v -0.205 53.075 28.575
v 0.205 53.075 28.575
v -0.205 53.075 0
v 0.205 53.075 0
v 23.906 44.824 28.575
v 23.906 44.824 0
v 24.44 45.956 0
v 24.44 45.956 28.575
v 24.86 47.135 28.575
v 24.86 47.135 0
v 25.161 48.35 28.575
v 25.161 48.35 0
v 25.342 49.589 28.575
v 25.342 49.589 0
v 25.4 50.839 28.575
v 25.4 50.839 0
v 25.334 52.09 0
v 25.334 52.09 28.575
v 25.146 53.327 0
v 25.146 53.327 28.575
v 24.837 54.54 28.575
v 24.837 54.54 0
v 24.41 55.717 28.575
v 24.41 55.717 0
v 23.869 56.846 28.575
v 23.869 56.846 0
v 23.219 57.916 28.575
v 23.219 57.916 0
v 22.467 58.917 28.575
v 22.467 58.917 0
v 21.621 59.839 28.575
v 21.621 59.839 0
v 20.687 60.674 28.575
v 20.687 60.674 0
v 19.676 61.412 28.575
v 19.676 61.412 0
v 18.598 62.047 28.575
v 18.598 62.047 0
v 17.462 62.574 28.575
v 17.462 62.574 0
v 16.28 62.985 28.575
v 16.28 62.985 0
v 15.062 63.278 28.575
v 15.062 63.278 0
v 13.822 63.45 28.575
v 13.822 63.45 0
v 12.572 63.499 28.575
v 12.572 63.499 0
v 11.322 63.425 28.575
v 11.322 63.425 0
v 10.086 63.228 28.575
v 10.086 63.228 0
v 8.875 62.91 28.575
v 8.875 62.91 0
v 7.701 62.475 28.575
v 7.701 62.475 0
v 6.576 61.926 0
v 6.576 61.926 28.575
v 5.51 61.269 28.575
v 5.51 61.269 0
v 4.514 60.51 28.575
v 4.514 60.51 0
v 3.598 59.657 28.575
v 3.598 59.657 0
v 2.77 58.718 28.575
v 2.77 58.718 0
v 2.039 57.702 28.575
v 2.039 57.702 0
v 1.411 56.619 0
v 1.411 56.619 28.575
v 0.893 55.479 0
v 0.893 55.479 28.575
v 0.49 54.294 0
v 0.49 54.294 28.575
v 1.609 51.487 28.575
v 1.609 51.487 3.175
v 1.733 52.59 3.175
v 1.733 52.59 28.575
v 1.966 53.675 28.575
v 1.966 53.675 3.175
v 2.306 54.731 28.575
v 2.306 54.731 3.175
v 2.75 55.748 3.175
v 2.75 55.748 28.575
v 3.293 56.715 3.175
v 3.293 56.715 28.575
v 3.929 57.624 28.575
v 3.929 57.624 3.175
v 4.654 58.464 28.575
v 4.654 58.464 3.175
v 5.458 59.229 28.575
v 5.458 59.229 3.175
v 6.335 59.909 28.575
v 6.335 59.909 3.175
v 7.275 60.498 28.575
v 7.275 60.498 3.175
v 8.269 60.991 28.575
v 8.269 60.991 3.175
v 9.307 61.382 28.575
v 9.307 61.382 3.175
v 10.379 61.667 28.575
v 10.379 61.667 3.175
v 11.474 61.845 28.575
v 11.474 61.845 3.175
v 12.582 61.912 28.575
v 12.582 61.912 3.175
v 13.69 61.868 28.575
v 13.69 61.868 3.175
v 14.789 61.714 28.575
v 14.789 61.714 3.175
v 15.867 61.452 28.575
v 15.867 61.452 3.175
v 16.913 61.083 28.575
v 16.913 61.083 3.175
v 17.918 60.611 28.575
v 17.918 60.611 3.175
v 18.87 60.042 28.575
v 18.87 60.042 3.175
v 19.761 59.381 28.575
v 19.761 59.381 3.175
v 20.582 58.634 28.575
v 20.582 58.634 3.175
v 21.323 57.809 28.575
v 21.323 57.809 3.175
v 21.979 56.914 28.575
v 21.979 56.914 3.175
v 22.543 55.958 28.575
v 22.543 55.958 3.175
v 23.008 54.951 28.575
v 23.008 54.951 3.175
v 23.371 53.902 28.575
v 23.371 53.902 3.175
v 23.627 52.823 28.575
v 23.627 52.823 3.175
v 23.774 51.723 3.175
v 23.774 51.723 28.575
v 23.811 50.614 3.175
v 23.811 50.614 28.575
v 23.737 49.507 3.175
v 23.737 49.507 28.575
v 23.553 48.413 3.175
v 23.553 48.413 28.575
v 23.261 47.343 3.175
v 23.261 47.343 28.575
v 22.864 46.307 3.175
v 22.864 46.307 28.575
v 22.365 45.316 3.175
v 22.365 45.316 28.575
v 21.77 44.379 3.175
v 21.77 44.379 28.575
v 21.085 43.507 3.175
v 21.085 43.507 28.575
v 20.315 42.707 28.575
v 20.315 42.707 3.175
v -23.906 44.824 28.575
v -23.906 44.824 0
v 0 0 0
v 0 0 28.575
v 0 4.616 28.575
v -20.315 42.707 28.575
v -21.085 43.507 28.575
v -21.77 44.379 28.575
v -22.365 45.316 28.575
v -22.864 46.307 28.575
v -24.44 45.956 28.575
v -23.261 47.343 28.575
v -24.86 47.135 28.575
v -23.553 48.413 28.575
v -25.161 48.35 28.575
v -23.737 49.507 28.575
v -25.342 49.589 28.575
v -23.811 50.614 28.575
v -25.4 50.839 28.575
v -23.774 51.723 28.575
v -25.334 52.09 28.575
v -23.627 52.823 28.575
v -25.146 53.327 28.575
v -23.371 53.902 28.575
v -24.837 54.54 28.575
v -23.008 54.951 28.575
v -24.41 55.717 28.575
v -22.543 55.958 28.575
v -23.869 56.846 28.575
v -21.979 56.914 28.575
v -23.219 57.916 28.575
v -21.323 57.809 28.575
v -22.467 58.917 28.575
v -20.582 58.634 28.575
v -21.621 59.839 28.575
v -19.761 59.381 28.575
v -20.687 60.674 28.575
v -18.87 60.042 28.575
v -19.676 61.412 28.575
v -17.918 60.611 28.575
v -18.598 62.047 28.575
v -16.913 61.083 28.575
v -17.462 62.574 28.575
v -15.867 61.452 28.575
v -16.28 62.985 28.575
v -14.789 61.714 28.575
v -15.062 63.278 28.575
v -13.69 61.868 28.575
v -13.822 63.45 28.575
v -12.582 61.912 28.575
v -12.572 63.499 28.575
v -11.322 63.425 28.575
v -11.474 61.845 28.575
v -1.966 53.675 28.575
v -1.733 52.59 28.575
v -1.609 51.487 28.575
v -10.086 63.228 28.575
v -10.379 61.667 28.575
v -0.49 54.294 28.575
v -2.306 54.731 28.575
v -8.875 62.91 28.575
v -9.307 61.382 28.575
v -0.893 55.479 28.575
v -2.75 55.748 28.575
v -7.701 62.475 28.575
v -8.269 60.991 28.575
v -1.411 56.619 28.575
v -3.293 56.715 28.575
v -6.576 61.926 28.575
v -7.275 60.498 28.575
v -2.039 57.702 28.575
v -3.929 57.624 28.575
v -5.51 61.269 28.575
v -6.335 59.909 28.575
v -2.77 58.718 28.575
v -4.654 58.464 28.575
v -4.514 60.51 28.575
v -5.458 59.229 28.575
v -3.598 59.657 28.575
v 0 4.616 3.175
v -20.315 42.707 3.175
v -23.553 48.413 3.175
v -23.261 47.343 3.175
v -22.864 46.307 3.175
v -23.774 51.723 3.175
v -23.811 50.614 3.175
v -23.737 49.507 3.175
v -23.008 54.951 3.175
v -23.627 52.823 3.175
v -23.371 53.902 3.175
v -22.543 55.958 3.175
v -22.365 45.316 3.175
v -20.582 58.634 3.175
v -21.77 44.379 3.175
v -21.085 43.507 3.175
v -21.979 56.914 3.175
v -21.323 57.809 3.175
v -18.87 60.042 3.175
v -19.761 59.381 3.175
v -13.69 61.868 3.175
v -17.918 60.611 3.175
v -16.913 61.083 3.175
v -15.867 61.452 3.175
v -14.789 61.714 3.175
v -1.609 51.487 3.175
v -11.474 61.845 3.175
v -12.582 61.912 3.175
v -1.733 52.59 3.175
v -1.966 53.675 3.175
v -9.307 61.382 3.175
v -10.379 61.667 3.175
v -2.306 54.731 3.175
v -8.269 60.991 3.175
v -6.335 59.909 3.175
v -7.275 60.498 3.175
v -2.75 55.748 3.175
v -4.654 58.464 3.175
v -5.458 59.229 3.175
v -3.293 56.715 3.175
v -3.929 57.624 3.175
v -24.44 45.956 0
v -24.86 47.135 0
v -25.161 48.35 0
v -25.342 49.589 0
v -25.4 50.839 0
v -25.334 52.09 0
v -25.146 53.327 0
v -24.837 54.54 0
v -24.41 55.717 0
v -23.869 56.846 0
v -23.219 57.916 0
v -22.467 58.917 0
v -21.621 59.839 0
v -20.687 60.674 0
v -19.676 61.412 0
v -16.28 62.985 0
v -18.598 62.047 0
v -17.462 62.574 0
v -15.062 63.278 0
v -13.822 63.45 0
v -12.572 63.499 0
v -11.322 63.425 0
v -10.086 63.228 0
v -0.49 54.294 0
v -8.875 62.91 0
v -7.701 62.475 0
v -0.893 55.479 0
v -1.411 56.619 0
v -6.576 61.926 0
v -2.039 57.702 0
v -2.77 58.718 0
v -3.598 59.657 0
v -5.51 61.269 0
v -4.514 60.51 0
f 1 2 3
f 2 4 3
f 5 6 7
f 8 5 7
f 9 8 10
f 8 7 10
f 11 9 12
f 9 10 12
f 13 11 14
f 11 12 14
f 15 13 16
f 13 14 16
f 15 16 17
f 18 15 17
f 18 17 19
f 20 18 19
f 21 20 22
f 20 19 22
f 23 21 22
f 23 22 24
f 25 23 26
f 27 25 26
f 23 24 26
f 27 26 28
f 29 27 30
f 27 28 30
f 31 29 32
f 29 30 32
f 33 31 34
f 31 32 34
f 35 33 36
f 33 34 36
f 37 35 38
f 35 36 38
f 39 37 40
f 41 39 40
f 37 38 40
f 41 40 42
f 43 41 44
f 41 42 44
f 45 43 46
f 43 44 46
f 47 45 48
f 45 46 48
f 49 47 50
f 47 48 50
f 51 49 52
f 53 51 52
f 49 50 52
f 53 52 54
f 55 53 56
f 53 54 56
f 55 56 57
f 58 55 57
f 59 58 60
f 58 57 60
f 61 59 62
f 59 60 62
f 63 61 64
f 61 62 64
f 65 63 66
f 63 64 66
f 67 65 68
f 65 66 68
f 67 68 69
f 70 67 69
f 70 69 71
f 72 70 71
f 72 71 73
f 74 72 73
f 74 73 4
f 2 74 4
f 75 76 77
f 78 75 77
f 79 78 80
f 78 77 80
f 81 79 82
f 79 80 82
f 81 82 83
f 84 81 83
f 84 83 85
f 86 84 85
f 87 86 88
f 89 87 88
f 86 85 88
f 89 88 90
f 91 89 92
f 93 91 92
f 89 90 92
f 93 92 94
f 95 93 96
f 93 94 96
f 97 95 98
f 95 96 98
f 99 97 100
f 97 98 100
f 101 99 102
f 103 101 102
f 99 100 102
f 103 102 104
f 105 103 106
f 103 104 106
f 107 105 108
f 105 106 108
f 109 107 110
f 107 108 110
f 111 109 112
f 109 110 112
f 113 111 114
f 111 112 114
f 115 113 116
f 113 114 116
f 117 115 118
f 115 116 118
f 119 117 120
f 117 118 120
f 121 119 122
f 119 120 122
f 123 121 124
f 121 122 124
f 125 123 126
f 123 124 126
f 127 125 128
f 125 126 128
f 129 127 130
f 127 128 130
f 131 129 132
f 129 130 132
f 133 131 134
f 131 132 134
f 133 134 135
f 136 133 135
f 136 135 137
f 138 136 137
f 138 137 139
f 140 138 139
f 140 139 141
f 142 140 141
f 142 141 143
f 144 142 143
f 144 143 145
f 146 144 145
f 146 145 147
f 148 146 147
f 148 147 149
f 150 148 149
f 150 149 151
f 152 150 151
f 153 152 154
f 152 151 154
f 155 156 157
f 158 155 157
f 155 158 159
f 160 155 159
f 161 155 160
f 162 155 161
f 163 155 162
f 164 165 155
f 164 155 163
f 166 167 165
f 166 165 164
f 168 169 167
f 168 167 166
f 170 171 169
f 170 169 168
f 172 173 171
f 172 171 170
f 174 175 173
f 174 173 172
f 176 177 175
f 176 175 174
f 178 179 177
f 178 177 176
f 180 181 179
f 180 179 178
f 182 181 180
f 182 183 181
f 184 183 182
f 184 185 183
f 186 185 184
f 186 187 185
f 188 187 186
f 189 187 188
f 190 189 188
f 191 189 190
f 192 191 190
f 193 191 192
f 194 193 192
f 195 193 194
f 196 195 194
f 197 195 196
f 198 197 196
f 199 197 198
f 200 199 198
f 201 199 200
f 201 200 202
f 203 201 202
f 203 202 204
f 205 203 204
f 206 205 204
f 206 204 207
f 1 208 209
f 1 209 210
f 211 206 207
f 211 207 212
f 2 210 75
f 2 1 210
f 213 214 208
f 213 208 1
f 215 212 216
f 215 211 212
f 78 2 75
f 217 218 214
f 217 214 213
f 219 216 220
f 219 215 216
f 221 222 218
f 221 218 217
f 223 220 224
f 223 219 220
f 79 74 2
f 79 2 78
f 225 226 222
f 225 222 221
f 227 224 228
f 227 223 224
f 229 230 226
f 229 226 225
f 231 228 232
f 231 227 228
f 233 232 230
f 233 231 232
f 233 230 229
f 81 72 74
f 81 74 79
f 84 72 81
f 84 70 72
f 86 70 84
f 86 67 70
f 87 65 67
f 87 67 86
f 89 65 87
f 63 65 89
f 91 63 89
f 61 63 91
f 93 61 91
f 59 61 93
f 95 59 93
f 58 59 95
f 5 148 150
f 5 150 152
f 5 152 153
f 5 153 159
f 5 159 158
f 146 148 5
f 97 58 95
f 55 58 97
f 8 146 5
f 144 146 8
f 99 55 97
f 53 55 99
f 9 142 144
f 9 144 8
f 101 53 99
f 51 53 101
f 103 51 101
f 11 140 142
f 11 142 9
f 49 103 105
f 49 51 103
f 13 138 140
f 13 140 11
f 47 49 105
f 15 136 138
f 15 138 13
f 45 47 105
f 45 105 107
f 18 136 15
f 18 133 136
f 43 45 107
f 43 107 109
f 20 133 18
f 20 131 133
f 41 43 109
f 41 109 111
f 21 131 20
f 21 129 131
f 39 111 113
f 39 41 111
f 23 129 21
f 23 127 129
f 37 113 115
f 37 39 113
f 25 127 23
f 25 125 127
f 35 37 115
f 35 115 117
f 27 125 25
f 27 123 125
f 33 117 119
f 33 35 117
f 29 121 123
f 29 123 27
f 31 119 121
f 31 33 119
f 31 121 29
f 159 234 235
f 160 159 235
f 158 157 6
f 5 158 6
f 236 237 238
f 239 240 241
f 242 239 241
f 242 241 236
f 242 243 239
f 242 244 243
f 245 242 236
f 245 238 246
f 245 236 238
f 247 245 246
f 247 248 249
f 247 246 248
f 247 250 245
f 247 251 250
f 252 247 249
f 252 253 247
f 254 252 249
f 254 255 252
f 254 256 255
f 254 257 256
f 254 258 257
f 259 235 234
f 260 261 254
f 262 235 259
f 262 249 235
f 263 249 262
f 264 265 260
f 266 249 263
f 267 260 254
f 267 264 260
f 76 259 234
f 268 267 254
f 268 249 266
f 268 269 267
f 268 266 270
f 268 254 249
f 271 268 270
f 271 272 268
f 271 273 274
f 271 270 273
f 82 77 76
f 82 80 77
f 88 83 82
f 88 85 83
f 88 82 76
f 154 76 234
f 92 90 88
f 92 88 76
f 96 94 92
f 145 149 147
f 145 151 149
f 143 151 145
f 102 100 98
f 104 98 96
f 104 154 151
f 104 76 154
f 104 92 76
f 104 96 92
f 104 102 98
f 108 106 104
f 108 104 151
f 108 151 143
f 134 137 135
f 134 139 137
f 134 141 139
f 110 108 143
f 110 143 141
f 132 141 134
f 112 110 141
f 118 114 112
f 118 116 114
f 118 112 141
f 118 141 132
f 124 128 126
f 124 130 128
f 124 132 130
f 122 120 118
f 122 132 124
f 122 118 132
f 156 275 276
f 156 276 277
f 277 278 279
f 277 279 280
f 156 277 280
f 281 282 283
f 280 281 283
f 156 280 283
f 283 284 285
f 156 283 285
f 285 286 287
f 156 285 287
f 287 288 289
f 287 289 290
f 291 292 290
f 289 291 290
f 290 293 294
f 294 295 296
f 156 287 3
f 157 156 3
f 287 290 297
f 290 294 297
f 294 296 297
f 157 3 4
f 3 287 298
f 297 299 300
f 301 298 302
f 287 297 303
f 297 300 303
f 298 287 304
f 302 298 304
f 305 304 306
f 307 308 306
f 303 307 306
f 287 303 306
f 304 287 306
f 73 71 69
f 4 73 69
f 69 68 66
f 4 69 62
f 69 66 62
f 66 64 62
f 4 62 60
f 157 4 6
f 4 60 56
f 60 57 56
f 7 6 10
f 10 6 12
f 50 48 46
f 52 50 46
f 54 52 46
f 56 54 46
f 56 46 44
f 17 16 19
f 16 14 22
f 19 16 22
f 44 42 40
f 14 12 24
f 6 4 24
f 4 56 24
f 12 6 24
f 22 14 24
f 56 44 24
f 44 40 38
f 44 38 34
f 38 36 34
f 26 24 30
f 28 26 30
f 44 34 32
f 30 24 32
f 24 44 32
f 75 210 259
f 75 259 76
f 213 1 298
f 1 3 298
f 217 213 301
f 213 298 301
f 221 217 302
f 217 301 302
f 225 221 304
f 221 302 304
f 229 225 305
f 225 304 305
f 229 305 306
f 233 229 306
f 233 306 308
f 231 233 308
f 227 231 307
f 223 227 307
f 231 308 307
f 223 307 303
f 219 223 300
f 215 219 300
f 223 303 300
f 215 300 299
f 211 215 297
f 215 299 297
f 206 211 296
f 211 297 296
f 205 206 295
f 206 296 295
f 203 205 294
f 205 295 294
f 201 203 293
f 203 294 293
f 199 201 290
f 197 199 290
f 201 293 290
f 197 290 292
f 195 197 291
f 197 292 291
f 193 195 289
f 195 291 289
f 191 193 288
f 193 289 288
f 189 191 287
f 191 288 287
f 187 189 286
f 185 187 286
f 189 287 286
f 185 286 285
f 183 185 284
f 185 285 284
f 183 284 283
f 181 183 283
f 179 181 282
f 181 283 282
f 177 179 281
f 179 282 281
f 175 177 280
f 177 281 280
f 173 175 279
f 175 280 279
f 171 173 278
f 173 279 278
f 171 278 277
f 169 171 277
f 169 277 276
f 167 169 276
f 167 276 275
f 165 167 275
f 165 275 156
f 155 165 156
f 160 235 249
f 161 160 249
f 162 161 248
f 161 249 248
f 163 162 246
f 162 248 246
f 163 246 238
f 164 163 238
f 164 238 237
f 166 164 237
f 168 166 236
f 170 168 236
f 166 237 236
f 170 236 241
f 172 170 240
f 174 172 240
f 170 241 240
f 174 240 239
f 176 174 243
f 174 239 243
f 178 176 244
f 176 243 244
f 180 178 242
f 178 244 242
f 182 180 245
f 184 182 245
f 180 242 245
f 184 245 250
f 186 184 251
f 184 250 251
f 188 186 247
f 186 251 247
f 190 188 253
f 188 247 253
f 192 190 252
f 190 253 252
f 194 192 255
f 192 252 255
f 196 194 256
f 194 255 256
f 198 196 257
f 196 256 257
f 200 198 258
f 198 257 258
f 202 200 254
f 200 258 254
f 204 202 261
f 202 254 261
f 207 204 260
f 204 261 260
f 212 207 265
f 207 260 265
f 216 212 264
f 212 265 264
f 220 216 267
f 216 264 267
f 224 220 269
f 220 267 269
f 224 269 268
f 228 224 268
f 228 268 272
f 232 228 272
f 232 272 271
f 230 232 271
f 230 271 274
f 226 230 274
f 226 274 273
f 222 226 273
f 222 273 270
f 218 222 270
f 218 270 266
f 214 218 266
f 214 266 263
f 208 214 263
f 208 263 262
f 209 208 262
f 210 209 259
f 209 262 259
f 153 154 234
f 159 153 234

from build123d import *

# Parameters (mm, degrees)
F1_DEPTH = 3.175
F3_DEPTH = 25.4


with BuildPart() as f1:
    # F0 (on Top) → F1 (new body)
    with BuildSketch(Plane.XY):
        with BuildLine():
            Line((0.205414, 53.074933), (-0.205414, 53.074933))
            ThreePointArc((-0.205414, 53.074933), (-16.875716, 62.79389), (-23.905882, 44.823529))
            Line((-23.905882, 44.823529), (0, 0))
            Line((0, 0), (23.905882, 44.823529))
            ThreePointArc((23.905882, 44.823529), (16.875716, 62.79389), (0.205414, 53.074933))
        make_face()
    extrude(amount=F1_DEPTH)

    # F2 (on face) → F3 (join)
    with BuildSketch(Plane.XY.offset(3.175)):
        with BuildLine():
            ThreePointArc((23.905882, 44.823529), (16.875716, 62.79389), (0.205414, 53.074933))
            Line((0.205414, 53.074933), (-0.205414, 53.074933))
            ThreePointArc((-0.205414, 53.074933), (-16.875716, 62.79389), (-23.905882, 44.823529))
            Line((-23.905882, 44.823529), (0, 0))
            Line((0, 0), (23.905882, 44.823529))
        make_face()
        with BuildLine():
            ThreePointArc((-20.315473, 42.707274), (-17.421546, 60.859556), (-1.608783, 51.487433))
            Line((-1.608783, 51.487433), (1.608783, 51.487433))
            ThreePointArc((1.608783, 51.487433), (17.421546, 60.859556), (20.315473, 42.707274))
            Line((20.315473, 42.707274), (0, 4.615761))
            Line((0, 4.615761), (-20.315473, 42.707274))
        make_face(mode=Mode.SUBTRACT)
    extrude(amount=F3_DEPTH)


solid = f1.part
